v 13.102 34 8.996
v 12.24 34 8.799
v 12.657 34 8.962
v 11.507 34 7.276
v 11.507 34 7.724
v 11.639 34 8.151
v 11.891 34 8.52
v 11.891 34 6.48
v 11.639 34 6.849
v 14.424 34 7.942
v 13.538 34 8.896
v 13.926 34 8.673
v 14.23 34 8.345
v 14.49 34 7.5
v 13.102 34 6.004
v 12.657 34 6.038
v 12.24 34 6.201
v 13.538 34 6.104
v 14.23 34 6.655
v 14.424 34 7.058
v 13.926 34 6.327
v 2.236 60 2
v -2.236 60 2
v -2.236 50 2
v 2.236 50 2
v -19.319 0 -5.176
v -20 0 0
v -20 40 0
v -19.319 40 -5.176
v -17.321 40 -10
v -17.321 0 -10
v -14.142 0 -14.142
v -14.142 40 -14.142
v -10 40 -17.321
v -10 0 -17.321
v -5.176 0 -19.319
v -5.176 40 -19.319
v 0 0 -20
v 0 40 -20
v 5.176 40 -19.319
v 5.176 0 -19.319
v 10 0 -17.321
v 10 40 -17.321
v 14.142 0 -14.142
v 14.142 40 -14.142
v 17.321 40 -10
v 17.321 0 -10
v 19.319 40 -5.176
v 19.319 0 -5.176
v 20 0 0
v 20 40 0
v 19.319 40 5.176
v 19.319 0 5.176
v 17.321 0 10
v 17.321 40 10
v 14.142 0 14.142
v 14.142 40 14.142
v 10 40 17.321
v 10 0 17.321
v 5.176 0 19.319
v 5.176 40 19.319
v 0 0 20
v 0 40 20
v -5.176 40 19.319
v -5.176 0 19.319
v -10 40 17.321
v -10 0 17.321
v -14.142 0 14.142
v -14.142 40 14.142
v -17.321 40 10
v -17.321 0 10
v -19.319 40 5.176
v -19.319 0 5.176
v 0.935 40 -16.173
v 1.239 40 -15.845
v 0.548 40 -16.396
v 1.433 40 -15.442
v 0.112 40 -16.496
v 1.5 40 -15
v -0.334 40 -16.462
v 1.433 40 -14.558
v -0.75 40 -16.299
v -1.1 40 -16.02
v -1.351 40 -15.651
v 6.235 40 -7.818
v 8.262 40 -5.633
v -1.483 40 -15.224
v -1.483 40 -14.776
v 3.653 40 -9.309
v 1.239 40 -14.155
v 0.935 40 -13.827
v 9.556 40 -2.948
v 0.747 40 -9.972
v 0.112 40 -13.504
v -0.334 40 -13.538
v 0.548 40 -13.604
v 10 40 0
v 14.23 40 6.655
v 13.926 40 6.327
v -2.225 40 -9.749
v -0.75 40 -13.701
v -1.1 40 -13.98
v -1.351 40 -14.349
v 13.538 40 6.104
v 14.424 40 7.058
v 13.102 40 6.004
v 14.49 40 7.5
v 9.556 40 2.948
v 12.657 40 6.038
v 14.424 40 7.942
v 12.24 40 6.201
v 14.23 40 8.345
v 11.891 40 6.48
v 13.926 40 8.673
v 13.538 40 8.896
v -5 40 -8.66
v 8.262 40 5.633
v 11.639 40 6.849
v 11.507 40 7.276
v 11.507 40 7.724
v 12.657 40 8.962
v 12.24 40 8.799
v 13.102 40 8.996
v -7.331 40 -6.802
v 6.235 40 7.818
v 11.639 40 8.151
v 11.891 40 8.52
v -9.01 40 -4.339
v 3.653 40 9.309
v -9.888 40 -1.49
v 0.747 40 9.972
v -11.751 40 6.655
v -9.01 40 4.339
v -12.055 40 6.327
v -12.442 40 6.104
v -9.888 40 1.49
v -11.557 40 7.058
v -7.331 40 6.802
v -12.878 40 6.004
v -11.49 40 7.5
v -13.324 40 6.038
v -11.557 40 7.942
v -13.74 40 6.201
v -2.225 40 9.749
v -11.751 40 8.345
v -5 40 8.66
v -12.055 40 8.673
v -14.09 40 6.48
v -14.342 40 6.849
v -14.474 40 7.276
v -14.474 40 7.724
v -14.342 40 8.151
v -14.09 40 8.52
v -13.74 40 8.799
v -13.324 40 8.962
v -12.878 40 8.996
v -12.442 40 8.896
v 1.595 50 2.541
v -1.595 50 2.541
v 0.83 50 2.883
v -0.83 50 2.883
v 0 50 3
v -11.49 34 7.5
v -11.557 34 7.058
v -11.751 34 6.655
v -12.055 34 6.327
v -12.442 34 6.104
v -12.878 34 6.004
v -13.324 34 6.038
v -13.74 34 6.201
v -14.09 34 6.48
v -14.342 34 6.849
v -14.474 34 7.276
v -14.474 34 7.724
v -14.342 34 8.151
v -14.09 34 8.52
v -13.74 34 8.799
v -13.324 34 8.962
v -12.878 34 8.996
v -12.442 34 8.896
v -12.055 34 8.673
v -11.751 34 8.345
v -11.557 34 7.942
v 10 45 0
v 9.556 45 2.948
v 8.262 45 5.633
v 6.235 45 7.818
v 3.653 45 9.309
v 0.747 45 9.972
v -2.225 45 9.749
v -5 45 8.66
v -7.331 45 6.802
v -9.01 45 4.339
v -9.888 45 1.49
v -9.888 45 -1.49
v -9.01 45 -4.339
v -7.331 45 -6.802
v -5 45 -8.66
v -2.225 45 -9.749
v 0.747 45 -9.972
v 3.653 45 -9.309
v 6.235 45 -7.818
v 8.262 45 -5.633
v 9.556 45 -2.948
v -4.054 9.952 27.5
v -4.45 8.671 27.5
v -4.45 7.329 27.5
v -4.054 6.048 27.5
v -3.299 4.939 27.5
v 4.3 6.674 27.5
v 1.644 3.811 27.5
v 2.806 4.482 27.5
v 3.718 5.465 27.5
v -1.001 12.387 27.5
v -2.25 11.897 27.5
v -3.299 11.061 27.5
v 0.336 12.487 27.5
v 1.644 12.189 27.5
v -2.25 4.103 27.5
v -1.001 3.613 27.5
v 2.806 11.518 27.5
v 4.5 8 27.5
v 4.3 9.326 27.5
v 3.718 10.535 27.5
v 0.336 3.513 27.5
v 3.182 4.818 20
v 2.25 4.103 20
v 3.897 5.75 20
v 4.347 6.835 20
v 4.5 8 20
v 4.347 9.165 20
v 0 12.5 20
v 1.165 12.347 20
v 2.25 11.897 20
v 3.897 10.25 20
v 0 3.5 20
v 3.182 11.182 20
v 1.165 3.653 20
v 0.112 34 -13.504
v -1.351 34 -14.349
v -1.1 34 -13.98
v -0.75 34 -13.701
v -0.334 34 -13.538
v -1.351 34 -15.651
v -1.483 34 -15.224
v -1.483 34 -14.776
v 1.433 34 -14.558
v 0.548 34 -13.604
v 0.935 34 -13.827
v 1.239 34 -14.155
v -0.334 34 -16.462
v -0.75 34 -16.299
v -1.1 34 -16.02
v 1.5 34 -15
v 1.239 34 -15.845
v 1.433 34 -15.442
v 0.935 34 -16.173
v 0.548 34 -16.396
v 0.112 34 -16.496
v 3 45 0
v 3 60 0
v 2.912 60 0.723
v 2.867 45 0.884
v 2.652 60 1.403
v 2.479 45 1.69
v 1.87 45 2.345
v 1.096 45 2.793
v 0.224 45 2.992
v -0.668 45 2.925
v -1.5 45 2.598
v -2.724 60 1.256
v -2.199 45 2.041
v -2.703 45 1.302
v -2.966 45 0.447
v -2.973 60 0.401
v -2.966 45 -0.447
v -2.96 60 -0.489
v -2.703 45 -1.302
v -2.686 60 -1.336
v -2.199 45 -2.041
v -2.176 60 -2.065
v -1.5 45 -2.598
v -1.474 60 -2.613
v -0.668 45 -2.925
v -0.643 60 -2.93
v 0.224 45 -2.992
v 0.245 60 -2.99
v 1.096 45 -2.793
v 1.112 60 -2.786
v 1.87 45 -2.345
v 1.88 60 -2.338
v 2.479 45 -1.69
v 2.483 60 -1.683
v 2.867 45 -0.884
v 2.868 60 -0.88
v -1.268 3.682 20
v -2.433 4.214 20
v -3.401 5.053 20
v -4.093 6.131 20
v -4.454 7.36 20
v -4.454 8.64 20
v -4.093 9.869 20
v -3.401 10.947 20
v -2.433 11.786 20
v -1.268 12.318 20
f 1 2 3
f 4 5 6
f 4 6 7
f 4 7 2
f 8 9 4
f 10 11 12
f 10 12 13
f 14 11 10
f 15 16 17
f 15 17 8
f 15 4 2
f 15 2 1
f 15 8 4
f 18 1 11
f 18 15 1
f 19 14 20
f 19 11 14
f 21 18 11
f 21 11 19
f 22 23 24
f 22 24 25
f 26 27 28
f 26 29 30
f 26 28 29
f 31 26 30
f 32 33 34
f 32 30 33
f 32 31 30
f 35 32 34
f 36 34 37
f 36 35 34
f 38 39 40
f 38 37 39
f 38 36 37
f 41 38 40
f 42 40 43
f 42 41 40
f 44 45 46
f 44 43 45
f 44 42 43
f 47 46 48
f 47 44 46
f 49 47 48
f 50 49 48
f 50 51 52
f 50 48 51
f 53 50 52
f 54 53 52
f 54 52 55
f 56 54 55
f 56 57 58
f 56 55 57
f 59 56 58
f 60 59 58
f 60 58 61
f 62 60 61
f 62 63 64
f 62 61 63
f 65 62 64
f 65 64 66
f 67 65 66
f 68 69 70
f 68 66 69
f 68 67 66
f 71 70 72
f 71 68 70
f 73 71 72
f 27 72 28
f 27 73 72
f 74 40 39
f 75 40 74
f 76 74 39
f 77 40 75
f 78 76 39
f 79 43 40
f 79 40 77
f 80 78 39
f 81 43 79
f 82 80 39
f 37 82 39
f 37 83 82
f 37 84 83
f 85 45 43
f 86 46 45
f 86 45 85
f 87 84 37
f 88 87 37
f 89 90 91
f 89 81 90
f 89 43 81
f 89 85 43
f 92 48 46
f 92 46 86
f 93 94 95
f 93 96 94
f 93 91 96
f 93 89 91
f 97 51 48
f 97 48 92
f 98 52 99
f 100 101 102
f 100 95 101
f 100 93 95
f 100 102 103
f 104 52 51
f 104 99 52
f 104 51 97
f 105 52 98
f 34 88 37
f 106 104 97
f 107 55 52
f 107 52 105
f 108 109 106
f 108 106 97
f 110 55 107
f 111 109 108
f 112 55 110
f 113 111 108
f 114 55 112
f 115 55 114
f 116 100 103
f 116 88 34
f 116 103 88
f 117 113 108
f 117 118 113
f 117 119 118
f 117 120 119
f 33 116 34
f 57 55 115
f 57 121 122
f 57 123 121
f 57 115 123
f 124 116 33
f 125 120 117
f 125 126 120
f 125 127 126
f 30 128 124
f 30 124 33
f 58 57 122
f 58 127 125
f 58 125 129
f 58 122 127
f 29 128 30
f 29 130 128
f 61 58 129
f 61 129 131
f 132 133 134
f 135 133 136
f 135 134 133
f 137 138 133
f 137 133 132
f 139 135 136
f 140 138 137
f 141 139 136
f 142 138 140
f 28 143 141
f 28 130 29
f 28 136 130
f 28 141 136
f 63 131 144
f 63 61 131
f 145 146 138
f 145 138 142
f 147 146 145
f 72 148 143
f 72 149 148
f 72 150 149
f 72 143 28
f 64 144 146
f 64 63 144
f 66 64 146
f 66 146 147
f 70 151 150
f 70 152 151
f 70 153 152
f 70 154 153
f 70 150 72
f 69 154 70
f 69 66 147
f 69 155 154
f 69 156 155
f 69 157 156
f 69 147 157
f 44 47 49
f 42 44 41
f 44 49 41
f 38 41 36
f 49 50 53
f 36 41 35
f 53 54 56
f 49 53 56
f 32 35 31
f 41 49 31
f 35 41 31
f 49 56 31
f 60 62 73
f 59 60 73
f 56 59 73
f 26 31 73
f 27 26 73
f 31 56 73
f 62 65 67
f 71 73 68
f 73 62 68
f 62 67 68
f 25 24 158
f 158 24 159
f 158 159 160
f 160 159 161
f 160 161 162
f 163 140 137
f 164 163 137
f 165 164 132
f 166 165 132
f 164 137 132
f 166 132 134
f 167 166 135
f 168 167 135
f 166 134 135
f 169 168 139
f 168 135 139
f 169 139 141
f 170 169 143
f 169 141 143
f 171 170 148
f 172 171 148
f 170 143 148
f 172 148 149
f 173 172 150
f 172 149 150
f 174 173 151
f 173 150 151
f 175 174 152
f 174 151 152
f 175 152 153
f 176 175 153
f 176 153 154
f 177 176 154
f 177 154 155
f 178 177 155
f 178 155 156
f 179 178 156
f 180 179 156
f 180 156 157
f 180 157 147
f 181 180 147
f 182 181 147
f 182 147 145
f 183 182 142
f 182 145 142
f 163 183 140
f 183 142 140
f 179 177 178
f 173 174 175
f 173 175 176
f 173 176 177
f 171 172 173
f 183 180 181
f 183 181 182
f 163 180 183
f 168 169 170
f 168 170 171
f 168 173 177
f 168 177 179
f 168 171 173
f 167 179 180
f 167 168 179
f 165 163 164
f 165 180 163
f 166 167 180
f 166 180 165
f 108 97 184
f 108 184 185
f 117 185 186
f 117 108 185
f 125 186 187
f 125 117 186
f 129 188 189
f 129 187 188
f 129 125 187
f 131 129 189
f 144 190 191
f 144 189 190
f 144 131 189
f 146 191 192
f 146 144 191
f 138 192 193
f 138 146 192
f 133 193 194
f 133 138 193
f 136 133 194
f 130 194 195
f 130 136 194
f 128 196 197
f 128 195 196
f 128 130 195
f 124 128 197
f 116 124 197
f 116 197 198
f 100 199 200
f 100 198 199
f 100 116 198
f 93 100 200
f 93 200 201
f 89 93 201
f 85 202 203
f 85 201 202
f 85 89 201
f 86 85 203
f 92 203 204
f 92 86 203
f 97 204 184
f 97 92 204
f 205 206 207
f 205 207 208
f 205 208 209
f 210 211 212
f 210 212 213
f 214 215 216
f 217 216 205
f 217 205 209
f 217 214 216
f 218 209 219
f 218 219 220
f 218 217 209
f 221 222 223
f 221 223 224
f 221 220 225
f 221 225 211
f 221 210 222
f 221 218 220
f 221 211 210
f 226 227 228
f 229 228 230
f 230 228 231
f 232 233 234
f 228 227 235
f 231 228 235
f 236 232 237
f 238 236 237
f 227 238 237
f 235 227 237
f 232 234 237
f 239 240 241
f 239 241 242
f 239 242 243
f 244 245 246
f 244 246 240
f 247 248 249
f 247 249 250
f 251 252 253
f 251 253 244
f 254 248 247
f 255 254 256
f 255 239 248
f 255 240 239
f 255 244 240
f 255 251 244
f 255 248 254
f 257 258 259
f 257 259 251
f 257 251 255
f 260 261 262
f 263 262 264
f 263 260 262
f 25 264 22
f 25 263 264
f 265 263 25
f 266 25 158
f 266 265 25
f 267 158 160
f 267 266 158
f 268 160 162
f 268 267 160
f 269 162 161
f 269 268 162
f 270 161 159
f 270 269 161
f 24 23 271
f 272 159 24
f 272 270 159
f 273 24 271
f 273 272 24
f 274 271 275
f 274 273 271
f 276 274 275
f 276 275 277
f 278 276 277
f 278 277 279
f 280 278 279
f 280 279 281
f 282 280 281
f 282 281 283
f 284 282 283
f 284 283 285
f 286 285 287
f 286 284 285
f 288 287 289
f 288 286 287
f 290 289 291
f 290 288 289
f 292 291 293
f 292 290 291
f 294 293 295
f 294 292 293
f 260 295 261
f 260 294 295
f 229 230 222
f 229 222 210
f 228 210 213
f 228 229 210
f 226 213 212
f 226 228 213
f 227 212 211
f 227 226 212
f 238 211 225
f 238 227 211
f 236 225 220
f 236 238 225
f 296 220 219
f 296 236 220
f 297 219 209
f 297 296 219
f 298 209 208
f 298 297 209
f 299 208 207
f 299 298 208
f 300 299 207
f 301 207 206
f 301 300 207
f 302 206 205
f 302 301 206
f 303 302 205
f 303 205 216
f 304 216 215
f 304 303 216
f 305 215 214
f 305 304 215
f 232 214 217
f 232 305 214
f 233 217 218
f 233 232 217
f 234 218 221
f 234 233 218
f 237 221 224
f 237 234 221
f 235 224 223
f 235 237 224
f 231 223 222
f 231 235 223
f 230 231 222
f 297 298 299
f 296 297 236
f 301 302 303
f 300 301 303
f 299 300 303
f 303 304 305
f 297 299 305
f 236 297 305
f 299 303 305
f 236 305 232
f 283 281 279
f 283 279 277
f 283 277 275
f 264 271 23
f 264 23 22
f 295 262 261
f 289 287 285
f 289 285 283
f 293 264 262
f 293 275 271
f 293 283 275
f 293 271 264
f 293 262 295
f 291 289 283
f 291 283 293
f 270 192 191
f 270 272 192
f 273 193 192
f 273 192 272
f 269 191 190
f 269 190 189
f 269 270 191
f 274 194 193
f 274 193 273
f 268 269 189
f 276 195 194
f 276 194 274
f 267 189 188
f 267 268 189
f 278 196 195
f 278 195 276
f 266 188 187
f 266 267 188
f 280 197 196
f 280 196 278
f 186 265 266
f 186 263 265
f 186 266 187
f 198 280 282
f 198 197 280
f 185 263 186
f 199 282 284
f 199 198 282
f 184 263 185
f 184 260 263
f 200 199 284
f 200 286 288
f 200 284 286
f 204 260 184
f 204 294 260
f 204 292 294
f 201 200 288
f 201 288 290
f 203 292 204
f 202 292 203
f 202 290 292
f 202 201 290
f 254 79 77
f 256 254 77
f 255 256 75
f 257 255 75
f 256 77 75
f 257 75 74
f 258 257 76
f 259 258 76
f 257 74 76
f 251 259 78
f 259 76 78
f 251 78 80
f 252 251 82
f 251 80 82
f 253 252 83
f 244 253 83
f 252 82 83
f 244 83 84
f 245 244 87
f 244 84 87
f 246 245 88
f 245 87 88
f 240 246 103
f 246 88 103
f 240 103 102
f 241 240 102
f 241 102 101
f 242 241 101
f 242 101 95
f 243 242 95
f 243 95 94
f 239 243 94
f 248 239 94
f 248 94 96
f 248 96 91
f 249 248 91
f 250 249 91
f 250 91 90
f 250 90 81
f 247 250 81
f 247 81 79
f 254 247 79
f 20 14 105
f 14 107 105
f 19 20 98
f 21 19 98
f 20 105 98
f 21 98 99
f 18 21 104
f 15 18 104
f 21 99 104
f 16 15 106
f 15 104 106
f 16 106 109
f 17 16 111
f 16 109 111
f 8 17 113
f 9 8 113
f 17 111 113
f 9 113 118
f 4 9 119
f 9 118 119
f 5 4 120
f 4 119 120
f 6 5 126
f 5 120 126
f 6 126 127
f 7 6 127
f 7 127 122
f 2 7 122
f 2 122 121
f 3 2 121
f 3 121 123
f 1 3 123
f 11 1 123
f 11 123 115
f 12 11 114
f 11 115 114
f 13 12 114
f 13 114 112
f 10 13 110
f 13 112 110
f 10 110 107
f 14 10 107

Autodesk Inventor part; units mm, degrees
ref_plane "YZ Plane" through (0, 0, 0) normal (1, 0, 0) x (0, 1, 0)
ref_plane "XZ Plane" through (0, 0, 0) normal (0, 1, 0) x (-1, 0, 0)
sketch "BodySketch" plane through (0, 0, 0) normal (0, 1, 0) x (-1, 0, 0)
  circle A0 centre (0, 0) radius 20
  dimension "Encoder_Body_Diameter" = 40
extrude "Body" add sketch "BodySketch" along normal blind 40
sketch "BearingSketch" plane through (0, 40, 0) normal (0, 1, 0) x (1, 0, 0)
  circle A0 centre (0, 0) radius 20 projected
  circle A1 centre (0, 0) radius 10
  dimension "Encoder_Bearing_Diameter" = 20
extrude "Bearing" add sketch "BearingSketch" along normal blind 5 contours A1
sketch "ShaftSketch" plane through (0, 45, 0) normal (0, 1, 0) x (1, 0, 0)
  circle A0 centre (0, 0) radius 10 projected
  circle A1 centre (0, 0) radius 3
  dimension "d12" = 6
extrude "Shaft" add sketch "ShaftSketch" along normal blind 15 contours A1
sketch "MeplatSketch" plane through (0, 60, 0) normal (0, 1, 0) x (1, 0, 0)
  circle A0 centre (0, 0) radius 3 projected
  line L0 (-2.2361, -2) -> (2.2361, -2)
  dimension "d16" = 1
extrude "Meplat" cut sketch "MeplatSketch" against normal blind 10 contours L0 A0 picked at (-0.5653, -2.1582)
sketch "FasteningHoleSketch" plane through (0, 40, 0) normal (0, 1, 0) x (1, 0, 0)
  circle A0 centre (0, 0) radius 10 projected
  circle A1 centre (0, 0) radius 20 projected
  circle A2 centre (0, 15) radius 1.5
  line L0 (0, 0) -> (0, 35.8513) construction
  circle A3 centre (-12.9904, -7.5) radius 1.5
  circle A4 centre (12.9904, -7.5) radius 1.5
  dimension "Encoder_FasteningHole_Diameter" = 3
  dimension "Encoder_FasteningHole_DistanceToCenter" = 15
  dimension "d23" = 360
extrude "FasteningHole" cut sketch "FasteningHoleSketch" against normal blind 6 contours A2 | A3 | A4
ref_plane "Work Plane1" through (0, 0, 20) normal (0, 0, 1) x (1, 0, 0)
sketch "CableBaseSketch" plane through (0, 0, 20) normal (0, 0, 1) x (1, 0, 0)
  circle A0 centre (0, 8) radius 4.5
  line L0 (0, 0) -> (0, 79.6657) construction
  dimension "Encoder_CableBase_Diameter" = 9
  dimension "Encoder_CableBase_DistanceToBase" = 8
extrude "CableBase" add sketch "CableBaseSketch" along normal blind 7.5
thread "Thread1" size "M3x0.5" class "6H" standard "ANSI Metric M Profile" full length
thread "Thread2" size "M3x0.5" class "6H" standard "ANSI Metric M Profile" full length
thread "Thread3" size "M3x0.5" class "6H" standard "ANSI Metric M Profile" full length
equation "\"d12\" = Encoder_Shaft_Diameter"
equation "\"d13\" = Encoder_Shaft_Length"
equation "\"d16\" = Encoder_Shaft_Meplat_Depth"
equation "\"d17\" = Encoder_Shaft_Meplat_Lenght"
equation "\"Encoder_Shaft_Diameter\" = 6"
equation "\"Encoder_Shaft_Length\" = 15"
equation "\"Encoder_Shaft_Meplat_Depth\" = 1"
equation "\"Encoder_Shaft_Meplat_Lenght\" = 10"
equation "\"Encoder_CableBase_DistanceToTop\" = Encoder_Body_Length - Encoder_CableBase_DistanceToBase"
equation "\"Encoder_Body_Length\" = 40"
properties part number "Encoder" material "GFRC"
